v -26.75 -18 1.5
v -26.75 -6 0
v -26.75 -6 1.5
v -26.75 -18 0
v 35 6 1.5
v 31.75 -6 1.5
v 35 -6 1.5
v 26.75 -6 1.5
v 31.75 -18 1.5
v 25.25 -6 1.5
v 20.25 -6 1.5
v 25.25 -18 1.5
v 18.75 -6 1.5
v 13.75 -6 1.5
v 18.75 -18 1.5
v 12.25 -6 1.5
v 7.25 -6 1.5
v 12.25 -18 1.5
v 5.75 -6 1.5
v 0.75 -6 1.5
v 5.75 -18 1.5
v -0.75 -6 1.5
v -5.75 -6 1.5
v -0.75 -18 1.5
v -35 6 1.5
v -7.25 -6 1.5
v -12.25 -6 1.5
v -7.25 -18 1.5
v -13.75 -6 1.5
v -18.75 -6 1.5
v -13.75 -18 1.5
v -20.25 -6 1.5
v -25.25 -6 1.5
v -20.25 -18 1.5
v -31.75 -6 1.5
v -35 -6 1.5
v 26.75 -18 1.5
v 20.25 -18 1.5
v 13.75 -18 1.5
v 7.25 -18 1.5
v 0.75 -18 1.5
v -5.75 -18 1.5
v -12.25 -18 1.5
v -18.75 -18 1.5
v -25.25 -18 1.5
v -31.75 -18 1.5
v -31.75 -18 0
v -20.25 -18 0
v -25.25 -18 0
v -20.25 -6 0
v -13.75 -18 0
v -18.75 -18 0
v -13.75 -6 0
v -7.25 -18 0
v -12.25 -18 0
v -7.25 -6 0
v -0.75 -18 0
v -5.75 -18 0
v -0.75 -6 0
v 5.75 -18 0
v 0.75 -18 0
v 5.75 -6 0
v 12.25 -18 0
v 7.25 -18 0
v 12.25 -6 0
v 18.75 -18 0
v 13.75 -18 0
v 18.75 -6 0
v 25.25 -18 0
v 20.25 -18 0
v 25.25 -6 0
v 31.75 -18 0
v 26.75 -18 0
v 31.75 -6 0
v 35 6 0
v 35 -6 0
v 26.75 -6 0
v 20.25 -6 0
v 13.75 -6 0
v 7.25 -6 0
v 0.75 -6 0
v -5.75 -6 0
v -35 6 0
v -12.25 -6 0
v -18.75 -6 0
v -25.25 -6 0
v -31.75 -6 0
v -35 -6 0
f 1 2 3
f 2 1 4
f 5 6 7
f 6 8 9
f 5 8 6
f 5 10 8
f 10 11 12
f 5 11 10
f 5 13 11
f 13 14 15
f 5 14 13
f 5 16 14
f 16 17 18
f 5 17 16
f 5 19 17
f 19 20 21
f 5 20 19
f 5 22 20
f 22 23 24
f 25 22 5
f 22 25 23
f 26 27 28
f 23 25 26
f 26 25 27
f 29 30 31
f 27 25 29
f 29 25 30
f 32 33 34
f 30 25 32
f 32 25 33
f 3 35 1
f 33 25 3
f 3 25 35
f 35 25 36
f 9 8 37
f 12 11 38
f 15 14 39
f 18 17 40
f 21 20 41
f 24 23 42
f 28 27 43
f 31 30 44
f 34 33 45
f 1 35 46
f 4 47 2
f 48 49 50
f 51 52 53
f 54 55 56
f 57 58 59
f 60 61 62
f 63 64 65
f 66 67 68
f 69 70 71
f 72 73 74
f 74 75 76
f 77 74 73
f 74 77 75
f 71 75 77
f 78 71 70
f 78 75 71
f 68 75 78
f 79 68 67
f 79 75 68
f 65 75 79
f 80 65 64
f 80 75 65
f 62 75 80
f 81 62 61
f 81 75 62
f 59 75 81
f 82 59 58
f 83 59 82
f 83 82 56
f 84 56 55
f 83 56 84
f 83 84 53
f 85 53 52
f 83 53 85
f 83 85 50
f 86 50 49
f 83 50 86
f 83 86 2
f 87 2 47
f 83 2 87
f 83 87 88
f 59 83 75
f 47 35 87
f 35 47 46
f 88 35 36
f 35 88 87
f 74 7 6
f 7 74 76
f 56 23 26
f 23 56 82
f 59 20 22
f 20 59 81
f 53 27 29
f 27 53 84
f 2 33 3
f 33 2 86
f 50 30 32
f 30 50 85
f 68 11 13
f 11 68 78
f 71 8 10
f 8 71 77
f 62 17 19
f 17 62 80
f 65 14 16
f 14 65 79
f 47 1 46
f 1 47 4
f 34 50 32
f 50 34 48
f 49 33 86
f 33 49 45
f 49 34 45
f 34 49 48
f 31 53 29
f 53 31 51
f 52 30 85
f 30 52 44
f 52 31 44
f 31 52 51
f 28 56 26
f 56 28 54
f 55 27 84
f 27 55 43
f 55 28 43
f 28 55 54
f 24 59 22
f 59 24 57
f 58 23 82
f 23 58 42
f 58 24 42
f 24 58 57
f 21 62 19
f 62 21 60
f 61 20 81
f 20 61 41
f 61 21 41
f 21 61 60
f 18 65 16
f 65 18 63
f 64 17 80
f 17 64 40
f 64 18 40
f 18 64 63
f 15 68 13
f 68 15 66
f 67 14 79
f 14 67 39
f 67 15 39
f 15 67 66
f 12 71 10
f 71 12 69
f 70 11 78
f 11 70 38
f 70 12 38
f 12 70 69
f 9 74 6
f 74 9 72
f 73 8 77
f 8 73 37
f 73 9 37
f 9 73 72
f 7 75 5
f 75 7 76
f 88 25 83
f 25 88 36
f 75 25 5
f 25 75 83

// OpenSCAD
// 10-well Agarose Gel Comb
// Designed for FDM printing, lying flat on the build plate.

// --- Dimensions (measured with calipers) ---
comb_thickness = 1.5;   // Z height of the entire comb
spine_length = 70;      // X length of the back bar (spine)
spine_width = 12;       // Y width of the back bar
tooth_width = 5.0;      // X width of each tooth
tooth_length = 12;      // Y length of each tooth (hangs in -Y)
gap_width = 1.5;        // Gap between neighbouring teeth
num_teeth = 10;         // Number of wells/teeth

// --- Derived Calculations ---
// Total width occupied by teeth and gaps
total_tooth_row_width = (num_teeth * tooth_width) + ((num_teeth - 1) * gap_width);

// Offset to center the row of teeth on the spine
// The spine is centered at X=0, so we shift the first tooth to start at -total_tooth_row_width/2
x_offset = -total_tooth_row_width / 2;

// --- Rendering Settings ---
$fn = 64; // High resolution for clean edges

// --- Main Construction ---
union() {
    // 1. The Spine (Back Bar)
    // Centered at origin, extending from -spine_length/2 to +spine_length/2 in X
    // and -spine_width/2 to +spine_width/2 in Y
    translate([-spine_length / 2, -spine_width / 2, 0])
        cube([spine_length, spine_width, comb_thickness]);

    // 2. The Teeth
    // Loop to create each tooth
    for (i = [0 : num_teeth - 1]) {
        // Calculate X position for the current tooth
        current_x = x_offset + (i * (tooth_width + gap_width));
        
        // Calculate Y position
        // Teeth hang in -Y direction from the spine.
        // The spine ends at Y = -spine_width/2.
        // So the tooth starts at Y = -spine_width/2 and extends to Y = -spine_width/2 - tooth_length
        current_y = -spine_width / 2 - tooth_length;
        
        translate([current_x, current_y, 0])
            cube([tooth_width, tooth_length, comb_thickness]);
    }
}
